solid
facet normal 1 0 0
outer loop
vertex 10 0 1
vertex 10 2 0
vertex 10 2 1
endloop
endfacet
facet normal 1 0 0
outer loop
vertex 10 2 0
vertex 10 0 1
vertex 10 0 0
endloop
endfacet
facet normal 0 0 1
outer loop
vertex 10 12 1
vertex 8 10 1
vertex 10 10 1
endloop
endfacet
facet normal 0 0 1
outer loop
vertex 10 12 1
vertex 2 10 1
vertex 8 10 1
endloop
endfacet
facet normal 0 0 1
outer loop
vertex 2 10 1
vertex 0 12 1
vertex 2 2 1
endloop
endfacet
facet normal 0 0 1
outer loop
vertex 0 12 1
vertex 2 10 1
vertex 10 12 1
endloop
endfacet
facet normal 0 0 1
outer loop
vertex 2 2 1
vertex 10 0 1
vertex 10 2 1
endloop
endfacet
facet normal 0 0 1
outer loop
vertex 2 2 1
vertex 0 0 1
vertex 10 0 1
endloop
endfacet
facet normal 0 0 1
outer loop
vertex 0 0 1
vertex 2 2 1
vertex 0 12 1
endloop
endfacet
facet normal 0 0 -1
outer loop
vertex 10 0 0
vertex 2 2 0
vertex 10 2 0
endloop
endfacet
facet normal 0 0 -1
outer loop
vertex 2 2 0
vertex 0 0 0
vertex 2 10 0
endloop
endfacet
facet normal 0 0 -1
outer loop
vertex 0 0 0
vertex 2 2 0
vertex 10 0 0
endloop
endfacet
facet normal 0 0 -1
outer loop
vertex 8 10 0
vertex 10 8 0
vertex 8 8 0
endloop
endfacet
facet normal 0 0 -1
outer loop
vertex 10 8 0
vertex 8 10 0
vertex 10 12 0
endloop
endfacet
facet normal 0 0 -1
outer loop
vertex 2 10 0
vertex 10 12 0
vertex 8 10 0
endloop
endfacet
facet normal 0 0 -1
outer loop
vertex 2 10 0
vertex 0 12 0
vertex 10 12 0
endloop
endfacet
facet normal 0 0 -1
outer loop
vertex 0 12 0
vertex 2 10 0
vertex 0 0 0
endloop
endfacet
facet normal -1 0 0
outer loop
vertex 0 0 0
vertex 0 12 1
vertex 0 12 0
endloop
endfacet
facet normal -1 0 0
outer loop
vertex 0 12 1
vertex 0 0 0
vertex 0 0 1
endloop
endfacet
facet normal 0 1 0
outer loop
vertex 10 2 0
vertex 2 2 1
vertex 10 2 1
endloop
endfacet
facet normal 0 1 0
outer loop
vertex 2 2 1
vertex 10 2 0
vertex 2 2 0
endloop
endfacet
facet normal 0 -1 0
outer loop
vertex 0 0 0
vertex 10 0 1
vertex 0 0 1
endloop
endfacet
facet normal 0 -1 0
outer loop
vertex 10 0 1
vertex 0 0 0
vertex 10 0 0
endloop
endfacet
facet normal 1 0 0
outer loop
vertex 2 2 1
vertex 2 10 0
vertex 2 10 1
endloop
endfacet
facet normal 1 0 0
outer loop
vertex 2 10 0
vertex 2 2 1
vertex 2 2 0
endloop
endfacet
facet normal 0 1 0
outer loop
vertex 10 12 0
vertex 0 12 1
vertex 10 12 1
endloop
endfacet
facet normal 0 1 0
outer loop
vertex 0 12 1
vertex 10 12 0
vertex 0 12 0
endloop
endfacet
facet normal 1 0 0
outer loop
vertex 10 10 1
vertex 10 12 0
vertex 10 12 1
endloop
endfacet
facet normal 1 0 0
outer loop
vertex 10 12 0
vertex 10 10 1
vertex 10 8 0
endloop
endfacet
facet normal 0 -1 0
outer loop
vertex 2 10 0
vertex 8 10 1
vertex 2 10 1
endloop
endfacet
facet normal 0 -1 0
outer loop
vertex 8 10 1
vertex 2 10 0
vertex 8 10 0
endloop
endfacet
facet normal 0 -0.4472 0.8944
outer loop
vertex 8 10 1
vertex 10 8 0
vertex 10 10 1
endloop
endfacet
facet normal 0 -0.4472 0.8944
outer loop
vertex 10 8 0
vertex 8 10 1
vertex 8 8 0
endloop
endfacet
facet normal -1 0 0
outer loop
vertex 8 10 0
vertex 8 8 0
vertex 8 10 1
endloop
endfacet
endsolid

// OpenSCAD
//First Block ( x, y, z )
cube(size=[10,2,1]);

//Move cursor ( x, y, z )
translate([0,2,0])
    //Next block
    cube(size=[2,10,1]);
    
//Move cursor
translate([0,10,0])
    //Next block
    cube([10,2,1]);

//Move cursor
translate([8,8,0])
    //cube(size=[2,2,1]);
    prism(2, 2, 1);
    
//funnel
polyhedron(
       points=[[8,2,0], [10,2,0], [10,4,0], [8,4,0], [8,2,1], [10,2,1]],
       faces=[[0,1,2,3],[5,4,3,2],[0,4,5,1],[3,0,4],[5,2,1]]);


//Build triangles function       
module prism(l, w, h){
       polyhedron(
               points=[[0,0,0], [l,0,0], [l,w,0], [0,w,0], [0,w,h], [l,w,h]],
               faces=[[0,1,2,3],[5,4,3,2],[0,4,5,1],[0,3,4],[5,2,1]]
               );
       
       // preview unfolded (do not include in your function
       /*z = 0.08;
       separation = 2;
       border = .2;
       translate([0,w+separation,0])
           cube([l,w,z]);
       translate([0,w+separation+w+border,0])
           cube([l,h,z]);
       translate([0,w+separation+w+border+h+border,0])
           cube([l,sqrt(w*w+h*h),z]);
       translate([l+border,w+separation+w+border+h+border,0])
           polyhedron(
                   points=[[0,0,0],[w,0,0],[0,sqrt(w*w+h*h),0], [0,0,z],[w,0,z],[0,sqrt(w*w+h*h),z]],
                   faces=[[0,1,2], [3,5,4], [0,3,4,1], [1,4,5,2], [2,5,3,0]]
                   );
       translate([0-border,w+separation+w+border+h+border,0])
           polyhedron(
                   points=[[0,0,0],[0-w,0,0],[0,sqrt(w*w+h*h),0], [0,0,z],[0-w,0,z],[0,sqrt(w*w+h*h),z]],
                   faces=[[1,0,2],[5,3,4],[0,1,4,3],[1,2,5,4],[2,0,3,5]]
                   );
                   */
       }
